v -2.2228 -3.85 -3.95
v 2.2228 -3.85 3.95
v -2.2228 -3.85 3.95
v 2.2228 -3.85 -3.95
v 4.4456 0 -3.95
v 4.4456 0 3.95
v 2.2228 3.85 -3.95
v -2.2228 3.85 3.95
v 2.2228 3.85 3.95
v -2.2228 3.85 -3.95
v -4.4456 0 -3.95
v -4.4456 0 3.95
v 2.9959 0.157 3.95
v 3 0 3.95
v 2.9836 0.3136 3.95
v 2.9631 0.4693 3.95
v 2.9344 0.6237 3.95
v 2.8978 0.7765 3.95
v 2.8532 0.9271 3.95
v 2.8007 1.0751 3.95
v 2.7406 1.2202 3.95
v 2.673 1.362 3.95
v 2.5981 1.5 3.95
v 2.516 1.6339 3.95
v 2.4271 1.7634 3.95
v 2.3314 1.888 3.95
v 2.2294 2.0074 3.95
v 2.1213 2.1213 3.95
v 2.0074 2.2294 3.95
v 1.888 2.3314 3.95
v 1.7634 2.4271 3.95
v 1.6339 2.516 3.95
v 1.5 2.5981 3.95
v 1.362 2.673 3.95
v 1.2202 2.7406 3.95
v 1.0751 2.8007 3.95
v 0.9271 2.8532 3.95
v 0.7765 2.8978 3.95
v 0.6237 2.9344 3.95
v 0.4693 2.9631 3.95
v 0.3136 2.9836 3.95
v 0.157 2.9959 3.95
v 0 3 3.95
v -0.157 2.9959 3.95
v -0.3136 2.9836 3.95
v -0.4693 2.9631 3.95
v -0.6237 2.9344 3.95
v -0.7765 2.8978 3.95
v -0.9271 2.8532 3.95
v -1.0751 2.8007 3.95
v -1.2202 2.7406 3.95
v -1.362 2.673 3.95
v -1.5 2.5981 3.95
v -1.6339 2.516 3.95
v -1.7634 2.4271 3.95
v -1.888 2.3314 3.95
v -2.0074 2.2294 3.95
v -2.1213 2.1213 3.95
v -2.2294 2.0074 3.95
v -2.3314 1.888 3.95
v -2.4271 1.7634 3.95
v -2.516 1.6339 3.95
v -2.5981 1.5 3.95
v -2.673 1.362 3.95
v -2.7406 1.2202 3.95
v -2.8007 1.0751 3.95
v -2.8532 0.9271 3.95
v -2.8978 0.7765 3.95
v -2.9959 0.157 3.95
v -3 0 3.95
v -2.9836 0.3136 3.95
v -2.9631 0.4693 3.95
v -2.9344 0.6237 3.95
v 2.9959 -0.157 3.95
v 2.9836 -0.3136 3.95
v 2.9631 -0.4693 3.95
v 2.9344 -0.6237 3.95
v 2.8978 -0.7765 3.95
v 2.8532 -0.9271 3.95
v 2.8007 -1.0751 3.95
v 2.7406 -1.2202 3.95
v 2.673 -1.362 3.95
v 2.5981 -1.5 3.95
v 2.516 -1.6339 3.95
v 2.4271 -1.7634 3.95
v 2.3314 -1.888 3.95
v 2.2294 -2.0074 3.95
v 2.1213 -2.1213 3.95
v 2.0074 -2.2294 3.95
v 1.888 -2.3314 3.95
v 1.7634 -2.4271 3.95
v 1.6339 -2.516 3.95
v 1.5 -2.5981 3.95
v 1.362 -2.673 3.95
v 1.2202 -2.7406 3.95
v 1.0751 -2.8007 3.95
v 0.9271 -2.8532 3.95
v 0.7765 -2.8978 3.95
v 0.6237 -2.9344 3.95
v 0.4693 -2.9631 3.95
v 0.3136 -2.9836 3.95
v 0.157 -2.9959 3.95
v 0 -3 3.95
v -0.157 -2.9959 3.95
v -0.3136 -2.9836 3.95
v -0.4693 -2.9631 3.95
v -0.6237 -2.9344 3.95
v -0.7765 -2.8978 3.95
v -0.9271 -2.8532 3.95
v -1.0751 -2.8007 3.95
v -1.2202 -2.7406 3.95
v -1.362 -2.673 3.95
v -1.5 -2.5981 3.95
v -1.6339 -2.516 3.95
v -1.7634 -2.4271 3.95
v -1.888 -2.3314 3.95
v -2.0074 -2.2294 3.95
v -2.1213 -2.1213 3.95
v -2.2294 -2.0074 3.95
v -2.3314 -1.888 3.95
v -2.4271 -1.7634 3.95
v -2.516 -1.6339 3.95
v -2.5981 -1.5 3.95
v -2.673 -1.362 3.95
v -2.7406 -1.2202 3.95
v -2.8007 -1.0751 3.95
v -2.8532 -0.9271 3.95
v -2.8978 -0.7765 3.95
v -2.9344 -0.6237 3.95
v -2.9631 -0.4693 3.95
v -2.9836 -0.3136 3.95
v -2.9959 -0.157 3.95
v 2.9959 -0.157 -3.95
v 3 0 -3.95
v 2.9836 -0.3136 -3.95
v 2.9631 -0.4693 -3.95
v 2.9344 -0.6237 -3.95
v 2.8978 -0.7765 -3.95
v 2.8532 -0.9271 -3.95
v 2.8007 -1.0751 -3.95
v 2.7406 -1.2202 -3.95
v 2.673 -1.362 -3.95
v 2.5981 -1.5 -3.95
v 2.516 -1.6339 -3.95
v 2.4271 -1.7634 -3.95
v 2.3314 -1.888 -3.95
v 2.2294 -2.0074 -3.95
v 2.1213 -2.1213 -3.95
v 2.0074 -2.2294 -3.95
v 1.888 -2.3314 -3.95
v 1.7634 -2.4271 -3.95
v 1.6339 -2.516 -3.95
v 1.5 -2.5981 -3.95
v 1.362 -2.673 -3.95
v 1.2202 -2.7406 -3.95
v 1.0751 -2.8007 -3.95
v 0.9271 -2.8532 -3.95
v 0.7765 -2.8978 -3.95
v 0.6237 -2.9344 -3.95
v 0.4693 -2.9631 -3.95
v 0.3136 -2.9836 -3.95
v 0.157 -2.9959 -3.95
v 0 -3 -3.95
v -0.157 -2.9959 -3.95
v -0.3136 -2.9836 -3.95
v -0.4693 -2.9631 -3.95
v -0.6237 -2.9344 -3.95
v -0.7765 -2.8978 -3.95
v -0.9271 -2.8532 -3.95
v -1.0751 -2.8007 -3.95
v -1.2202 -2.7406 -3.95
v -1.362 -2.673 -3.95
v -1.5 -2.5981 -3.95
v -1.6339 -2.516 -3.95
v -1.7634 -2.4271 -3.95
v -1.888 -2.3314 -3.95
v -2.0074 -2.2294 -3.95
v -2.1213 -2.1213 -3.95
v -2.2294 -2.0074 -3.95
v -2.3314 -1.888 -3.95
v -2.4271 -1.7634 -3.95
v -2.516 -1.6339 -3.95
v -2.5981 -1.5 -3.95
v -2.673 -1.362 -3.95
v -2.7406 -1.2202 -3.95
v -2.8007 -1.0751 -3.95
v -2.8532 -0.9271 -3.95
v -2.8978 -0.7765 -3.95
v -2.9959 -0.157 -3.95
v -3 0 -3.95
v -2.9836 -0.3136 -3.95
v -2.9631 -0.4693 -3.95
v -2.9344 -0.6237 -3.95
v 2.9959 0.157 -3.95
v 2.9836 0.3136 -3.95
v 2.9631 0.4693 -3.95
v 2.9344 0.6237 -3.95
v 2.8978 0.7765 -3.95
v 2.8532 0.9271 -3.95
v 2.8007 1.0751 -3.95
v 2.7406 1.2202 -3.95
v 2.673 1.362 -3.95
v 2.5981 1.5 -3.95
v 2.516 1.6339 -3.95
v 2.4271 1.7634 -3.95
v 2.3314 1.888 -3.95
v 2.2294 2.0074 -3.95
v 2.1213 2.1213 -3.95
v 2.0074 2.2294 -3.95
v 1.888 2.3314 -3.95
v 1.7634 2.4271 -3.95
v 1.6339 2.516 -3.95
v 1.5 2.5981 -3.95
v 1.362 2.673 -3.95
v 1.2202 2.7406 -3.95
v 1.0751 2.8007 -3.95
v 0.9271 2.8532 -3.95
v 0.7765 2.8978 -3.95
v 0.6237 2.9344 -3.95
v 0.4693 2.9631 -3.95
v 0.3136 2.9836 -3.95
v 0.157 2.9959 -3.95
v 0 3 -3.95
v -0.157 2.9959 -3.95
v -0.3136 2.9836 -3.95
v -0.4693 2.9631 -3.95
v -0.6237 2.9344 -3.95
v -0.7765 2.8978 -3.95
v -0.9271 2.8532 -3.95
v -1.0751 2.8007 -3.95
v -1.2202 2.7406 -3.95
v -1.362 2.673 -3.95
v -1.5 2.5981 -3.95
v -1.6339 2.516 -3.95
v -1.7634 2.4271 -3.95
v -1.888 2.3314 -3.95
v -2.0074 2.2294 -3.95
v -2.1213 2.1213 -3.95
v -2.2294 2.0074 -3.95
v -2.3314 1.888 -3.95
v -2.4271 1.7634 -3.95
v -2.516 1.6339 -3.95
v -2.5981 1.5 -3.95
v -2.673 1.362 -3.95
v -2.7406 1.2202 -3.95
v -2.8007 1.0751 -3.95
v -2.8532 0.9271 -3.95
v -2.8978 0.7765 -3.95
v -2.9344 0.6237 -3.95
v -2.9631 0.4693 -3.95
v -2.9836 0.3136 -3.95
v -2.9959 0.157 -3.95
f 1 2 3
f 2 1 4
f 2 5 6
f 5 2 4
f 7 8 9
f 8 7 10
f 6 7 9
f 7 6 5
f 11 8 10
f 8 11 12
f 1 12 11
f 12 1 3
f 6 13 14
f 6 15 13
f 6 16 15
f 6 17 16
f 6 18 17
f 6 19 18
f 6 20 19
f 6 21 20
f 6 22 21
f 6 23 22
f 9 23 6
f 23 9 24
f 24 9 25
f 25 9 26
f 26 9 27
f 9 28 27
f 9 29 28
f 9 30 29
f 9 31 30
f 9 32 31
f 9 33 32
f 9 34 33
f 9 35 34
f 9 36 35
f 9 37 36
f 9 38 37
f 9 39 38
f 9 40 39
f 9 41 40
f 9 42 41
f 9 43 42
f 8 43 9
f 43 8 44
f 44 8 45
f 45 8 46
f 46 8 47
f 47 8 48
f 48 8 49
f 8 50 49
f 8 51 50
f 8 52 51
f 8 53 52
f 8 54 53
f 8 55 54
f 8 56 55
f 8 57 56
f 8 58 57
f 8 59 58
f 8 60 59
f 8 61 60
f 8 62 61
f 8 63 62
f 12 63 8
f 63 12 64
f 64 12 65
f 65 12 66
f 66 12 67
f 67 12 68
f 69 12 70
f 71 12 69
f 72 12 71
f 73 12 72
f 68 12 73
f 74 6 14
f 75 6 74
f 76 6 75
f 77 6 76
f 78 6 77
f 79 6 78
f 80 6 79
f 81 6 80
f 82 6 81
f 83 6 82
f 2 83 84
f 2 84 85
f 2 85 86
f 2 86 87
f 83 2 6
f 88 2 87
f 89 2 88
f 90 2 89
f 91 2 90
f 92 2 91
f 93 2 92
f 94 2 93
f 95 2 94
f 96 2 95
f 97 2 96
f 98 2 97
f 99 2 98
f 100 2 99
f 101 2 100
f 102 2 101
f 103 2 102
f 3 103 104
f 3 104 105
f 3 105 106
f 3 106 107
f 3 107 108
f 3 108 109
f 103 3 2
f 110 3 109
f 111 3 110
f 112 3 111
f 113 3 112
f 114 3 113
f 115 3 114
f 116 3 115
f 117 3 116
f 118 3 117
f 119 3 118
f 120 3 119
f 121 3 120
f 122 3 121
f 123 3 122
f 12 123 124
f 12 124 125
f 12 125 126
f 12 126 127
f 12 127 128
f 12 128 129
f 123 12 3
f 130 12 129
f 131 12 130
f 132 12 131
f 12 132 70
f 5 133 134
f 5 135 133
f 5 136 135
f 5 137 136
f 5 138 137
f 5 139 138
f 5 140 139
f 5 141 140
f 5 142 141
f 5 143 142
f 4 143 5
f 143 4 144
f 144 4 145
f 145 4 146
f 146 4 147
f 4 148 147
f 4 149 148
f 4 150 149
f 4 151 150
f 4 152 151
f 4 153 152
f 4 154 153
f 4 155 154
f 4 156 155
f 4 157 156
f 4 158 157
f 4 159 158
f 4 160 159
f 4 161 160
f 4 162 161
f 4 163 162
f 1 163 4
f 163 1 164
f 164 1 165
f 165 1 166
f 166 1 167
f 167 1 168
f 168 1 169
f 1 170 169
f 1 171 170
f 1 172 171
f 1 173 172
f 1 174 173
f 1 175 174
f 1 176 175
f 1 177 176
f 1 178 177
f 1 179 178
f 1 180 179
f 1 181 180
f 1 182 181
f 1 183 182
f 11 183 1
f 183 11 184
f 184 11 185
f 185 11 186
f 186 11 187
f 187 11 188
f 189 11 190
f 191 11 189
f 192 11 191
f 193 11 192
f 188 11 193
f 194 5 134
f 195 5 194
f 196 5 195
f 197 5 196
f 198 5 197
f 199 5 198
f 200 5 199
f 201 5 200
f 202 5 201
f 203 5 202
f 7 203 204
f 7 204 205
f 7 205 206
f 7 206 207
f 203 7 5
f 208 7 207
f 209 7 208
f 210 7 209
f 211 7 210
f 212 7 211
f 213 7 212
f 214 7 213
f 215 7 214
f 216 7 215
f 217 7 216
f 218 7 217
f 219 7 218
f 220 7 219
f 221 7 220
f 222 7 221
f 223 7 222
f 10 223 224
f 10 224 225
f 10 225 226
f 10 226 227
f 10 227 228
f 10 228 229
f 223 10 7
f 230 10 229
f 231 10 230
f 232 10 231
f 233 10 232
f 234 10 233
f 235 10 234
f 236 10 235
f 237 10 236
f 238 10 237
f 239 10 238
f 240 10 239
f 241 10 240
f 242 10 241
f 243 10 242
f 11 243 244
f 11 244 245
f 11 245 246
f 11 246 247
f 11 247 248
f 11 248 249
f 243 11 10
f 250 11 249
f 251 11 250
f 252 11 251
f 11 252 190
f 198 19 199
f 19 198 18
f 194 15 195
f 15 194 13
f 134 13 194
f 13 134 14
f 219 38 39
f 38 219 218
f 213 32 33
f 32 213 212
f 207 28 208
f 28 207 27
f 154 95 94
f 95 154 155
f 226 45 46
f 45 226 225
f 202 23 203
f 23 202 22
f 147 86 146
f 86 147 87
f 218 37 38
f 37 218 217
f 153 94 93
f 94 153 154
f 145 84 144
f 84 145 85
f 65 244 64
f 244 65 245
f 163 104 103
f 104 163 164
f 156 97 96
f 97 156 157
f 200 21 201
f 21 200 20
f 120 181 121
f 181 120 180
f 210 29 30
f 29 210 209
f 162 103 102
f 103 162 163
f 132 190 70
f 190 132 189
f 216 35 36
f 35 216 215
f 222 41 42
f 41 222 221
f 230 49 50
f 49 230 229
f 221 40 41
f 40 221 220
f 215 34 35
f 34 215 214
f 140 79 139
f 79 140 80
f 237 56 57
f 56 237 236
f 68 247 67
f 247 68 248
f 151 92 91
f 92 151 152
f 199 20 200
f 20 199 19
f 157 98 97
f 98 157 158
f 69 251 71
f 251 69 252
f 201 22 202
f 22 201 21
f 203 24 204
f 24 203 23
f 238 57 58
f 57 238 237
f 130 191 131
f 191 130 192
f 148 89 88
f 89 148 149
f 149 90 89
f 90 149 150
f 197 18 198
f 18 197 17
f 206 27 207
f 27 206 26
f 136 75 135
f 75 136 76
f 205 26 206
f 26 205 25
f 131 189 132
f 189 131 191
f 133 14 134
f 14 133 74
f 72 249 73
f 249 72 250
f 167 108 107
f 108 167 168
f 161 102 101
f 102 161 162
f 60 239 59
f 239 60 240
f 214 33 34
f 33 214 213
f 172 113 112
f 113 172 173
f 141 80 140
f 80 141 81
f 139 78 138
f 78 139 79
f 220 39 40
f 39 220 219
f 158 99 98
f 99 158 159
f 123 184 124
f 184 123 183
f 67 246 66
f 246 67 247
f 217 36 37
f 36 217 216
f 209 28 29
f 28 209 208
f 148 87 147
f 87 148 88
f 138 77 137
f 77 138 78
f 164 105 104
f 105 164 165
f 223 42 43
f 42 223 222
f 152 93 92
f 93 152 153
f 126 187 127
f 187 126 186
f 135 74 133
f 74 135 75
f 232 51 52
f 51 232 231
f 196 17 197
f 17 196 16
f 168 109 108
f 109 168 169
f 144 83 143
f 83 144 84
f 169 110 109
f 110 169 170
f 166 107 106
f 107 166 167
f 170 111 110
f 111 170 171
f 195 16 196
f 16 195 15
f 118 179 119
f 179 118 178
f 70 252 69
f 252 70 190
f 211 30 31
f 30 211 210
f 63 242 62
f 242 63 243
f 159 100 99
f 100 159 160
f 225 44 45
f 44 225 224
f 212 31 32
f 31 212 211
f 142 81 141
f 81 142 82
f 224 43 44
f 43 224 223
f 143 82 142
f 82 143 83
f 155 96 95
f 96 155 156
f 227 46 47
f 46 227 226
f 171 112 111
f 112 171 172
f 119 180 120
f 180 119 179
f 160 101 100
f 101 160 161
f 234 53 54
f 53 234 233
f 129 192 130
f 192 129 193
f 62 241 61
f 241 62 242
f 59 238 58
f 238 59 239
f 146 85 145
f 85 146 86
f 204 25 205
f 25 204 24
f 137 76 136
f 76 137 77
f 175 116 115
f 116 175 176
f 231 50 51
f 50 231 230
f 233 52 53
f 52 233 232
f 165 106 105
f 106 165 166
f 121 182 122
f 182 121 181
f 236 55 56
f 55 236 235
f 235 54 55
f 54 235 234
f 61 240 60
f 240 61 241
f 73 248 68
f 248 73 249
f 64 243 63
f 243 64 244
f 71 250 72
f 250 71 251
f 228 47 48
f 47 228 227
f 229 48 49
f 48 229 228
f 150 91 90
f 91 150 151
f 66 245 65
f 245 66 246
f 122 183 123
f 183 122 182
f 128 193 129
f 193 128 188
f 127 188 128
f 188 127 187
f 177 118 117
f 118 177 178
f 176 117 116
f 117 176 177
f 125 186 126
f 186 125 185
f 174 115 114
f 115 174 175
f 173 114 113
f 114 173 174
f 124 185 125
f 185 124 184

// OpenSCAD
$fn = 120;

across_flats = 7.7;   // mm
thickness    = 7.9;   // mm
hole_diam    = 6.0;   // mm (through-bore)

eps = 0.05;

module hex_prism_af(af, h) {
    // across-flats = 2*apothem; circumradius R = apothem / cos(30°)
    R = (af/2) / cos(30);
    cylinder(h=h, r=R, $fn=6, center=true);
}

difference() {
    hex_prism_af(across_flats, thickness);
    // Ensure a clean through-hole in all views by overcutting in Z
    cylinder(h=thickness + 2*eps, d=hole_diam, center=true, $fn=120);
}
